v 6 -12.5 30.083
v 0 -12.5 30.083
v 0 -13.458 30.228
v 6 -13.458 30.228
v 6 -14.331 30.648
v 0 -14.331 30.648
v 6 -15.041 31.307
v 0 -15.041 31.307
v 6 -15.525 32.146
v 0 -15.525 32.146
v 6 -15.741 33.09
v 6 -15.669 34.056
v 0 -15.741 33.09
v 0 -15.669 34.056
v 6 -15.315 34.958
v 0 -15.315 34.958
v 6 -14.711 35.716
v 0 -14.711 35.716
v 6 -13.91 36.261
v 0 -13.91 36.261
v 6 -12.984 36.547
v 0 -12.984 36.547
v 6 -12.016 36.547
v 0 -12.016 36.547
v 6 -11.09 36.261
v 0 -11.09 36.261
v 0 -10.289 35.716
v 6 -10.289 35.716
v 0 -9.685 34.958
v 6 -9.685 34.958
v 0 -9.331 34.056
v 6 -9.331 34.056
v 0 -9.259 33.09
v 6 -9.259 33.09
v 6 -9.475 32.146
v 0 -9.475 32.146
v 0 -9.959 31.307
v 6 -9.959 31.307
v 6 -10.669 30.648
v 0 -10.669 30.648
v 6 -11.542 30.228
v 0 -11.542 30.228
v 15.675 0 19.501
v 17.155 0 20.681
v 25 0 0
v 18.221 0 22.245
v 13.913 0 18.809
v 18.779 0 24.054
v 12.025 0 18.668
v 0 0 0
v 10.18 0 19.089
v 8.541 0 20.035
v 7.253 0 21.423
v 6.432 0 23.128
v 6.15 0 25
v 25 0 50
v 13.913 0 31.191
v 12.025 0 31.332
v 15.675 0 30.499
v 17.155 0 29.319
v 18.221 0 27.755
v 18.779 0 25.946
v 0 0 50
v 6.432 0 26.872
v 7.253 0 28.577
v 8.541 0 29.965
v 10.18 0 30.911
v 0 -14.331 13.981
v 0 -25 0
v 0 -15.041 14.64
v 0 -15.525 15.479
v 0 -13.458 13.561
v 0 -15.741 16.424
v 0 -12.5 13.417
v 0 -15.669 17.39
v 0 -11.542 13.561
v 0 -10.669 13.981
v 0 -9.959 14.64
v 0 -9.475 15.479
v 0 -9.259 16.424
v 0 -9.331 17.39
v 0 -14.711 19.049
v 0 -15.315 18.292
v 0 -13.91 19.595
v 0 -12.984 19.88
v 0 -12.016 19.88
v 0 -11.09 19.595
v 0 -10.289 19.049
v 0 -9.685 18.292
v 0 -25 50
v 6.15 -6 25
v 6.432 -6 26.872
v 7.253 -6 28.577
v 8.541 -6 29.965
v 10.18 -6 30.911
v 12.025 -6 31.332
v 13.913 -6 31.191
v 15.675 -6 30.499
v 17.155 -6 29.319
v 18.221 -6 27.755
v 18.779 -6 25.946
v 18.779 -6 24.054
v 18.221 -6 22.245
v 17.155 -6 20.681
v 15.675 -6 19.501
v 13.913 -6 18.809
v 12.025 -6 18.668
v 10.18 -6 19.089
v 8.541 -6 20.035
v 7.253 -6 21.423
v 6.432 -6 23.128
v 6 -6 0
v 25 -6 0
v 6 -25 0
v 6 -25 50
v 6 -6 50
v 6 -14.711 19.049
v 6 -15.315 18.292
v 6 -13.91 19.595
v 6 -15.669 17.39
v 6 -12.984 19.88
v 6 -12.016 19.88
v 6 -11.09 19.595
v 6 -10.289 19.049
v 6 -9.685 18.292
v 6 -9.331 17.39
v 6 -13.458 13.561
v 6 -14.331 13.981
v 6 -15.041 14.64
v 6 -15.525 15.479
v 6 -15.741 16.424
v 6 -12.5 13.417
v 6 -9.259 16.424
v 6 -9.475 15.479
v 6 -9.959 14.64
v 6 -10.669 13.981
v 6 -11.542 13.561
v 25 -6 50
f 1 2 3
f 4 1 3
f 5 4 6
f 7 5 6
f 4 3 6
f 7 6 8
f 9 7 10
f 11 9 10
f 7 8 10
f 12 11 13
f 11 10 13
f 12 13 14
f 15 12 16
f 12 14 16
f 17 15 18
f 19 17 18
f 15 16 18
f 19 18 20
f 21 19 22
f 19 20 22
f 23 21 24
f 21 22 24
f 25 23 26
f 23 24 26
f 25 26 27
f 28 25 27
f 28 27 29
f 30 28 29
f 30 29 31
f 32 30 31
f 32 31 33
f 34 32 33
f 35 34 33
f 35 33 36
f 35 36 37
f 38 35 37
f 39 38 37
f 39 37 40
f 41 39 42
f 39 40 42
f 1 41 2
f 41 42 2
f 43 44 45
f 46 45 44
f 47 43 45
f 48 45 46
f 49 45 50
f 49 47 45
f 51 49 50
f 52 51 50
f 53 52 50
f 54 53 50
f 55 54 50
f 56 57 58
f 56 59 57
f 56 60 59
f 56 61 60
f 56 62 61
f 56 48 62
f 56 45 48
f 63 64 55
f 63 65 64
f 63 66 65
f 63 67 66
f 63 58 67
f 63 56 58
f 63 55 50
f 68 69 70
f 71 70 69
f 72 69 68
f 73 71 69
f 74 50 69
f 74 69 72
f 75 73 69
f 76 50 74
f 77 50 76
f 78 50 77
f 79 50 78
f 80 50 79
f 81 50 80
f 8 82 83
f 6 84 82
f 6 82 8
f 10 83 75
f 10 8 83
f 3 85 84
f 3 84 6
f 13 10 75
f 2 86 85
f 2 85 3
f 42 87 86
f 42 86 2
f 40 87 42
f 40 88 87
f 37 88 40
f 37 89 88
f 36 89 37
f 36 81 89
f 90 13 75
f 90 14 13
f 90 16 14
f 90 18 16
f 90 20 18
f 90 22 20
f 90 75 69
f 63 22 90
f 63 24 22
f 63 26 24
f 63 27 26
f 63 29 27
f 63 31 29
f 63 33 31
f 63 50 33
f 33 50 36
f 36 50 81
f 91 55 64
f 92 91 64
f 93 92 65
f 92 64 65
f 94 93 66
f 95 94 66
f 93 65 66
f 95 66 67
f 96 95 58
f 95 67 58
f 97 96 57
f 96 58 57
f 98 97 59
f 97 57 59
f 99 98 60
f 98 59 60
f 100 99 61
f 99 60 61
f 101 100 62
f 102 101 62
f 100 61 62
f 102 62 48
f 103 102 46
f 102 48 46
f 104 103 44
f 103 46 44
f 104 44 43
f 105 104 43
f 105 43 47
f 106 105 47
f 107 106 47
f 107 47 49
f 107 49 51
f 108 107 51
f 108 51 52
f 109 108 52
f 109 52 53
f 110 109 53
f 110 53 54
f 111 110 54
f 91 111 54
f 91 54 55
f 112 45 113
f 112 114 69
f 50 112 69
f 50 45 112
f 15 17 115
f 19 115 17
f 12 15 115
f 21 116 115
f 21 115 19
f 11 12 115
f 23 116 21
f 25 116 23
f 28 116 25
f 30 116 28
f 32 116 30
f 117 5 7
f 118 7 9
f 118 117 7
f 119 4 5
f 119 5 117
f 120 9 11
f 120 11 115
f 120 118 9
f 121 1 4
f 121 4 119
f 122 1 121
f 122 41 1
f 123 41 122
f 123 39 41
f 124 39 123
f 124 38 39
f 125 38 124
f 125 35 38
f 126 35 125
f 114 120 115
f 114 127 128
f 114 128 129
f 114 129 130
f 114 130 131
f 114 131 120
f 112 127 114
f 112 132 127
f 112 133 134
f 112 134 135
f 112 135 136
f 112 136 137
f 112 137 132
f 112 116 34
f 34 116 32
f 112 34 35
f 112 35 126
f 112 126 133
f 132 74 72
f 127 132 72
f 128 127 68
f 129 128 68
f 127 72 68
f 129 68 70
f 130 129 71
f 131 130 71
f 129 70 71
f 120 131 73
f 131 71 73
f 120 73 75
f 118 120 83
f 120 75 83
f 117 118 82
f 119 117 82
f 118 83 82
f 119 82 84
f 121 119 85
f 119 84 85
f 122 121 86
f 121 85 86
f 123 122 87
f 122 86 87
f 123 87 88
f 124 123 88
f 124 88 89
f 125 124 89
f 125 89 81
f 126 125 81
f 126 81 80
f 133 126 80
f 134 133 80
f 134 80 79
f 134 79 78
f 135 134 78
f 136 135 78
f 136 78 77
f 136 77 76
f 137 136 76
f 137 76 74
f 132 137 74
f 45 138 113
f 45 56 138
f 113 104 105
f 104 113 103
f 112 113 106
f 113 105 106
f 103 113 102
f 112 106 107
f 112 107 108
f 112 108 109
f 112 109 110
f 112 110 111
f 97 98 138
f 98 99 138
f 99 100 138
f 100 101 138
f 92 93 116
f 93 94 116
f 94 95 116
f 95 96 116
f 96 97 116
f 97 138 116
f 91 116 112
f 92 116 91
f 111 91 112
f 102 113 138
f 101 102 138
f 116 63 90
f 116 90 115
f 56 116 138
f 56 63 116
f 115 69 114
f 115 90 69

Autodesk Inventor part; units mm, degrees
ref_plane "YZ Plane" through (0, 0, 0) normal (1, 0, 0) x (0, 1, 0)
ref_plane "XZ Plane" through (0, 0, 0) normal (0, 1, 0) x (-1, 0, 0)
ref_plane "XY Plane" through (0, 0, 0) normal (0, 0, 1) x (1, 0, 0)
sketch "Sketch1" plane through (0, 0, 0) normal (0, 1, 0) x (-1, 0, 0)
  line L0 (0, 0) -> (0, 50)
  line L1 (0, 50) -> (-25, 50)
  line L2 (-25, 50) -> (-25, 0)
  line L3 (-25, 0) -> (0, 0)
  circle A0 centre (-12.5, 25) radius 6.35
  dimension "d0" = 50
  dimension "d1" = 25
  dimension "d2" = 12.7
extrude "Extrusion1" add sketch "Sketch1" against normal blind 6
sketch "Sketch2" plane through (0, -6, 0) normal (0, -1, 0) x (1, 0, 0)
  line L0 (0, 50) -> (0, 0) projected
  line L1 (0, 50) -> (6, 50)
  line L2 (25, 50) -> (0, 50) projected
  line L3 (6, 50) -> (6, 0)
  line L4 (0, 0) -> (25, 0) projected
  line L5 (6, 0) -> (0, 0)
  line L6 (0, 0) -> (0, 50)
  dimension "d5" = 6
extrude "Extrusion2" add sketch "Sketch2" along normal blind 19
sketch "Sketch3" plane through (6, -6, 50) normal (1, 0, 0) x (0, 0, -1)
  circle A0 centre (16.6667, -6.5) radius 3.25
  circle A1 centre (33.3333, -6.5) radius 3.25
  point P0 (50, 6)
  dimension "d8" = 6.5
  dimension "d9" = 6.5
hole "Hole1" at (6, -12.5, 33.3333) at (6, -12.5, 16.6667) direction (-1, 0, 0) diameter 6.5 depth 111
properties part number "Roter_shaft_support_top"
